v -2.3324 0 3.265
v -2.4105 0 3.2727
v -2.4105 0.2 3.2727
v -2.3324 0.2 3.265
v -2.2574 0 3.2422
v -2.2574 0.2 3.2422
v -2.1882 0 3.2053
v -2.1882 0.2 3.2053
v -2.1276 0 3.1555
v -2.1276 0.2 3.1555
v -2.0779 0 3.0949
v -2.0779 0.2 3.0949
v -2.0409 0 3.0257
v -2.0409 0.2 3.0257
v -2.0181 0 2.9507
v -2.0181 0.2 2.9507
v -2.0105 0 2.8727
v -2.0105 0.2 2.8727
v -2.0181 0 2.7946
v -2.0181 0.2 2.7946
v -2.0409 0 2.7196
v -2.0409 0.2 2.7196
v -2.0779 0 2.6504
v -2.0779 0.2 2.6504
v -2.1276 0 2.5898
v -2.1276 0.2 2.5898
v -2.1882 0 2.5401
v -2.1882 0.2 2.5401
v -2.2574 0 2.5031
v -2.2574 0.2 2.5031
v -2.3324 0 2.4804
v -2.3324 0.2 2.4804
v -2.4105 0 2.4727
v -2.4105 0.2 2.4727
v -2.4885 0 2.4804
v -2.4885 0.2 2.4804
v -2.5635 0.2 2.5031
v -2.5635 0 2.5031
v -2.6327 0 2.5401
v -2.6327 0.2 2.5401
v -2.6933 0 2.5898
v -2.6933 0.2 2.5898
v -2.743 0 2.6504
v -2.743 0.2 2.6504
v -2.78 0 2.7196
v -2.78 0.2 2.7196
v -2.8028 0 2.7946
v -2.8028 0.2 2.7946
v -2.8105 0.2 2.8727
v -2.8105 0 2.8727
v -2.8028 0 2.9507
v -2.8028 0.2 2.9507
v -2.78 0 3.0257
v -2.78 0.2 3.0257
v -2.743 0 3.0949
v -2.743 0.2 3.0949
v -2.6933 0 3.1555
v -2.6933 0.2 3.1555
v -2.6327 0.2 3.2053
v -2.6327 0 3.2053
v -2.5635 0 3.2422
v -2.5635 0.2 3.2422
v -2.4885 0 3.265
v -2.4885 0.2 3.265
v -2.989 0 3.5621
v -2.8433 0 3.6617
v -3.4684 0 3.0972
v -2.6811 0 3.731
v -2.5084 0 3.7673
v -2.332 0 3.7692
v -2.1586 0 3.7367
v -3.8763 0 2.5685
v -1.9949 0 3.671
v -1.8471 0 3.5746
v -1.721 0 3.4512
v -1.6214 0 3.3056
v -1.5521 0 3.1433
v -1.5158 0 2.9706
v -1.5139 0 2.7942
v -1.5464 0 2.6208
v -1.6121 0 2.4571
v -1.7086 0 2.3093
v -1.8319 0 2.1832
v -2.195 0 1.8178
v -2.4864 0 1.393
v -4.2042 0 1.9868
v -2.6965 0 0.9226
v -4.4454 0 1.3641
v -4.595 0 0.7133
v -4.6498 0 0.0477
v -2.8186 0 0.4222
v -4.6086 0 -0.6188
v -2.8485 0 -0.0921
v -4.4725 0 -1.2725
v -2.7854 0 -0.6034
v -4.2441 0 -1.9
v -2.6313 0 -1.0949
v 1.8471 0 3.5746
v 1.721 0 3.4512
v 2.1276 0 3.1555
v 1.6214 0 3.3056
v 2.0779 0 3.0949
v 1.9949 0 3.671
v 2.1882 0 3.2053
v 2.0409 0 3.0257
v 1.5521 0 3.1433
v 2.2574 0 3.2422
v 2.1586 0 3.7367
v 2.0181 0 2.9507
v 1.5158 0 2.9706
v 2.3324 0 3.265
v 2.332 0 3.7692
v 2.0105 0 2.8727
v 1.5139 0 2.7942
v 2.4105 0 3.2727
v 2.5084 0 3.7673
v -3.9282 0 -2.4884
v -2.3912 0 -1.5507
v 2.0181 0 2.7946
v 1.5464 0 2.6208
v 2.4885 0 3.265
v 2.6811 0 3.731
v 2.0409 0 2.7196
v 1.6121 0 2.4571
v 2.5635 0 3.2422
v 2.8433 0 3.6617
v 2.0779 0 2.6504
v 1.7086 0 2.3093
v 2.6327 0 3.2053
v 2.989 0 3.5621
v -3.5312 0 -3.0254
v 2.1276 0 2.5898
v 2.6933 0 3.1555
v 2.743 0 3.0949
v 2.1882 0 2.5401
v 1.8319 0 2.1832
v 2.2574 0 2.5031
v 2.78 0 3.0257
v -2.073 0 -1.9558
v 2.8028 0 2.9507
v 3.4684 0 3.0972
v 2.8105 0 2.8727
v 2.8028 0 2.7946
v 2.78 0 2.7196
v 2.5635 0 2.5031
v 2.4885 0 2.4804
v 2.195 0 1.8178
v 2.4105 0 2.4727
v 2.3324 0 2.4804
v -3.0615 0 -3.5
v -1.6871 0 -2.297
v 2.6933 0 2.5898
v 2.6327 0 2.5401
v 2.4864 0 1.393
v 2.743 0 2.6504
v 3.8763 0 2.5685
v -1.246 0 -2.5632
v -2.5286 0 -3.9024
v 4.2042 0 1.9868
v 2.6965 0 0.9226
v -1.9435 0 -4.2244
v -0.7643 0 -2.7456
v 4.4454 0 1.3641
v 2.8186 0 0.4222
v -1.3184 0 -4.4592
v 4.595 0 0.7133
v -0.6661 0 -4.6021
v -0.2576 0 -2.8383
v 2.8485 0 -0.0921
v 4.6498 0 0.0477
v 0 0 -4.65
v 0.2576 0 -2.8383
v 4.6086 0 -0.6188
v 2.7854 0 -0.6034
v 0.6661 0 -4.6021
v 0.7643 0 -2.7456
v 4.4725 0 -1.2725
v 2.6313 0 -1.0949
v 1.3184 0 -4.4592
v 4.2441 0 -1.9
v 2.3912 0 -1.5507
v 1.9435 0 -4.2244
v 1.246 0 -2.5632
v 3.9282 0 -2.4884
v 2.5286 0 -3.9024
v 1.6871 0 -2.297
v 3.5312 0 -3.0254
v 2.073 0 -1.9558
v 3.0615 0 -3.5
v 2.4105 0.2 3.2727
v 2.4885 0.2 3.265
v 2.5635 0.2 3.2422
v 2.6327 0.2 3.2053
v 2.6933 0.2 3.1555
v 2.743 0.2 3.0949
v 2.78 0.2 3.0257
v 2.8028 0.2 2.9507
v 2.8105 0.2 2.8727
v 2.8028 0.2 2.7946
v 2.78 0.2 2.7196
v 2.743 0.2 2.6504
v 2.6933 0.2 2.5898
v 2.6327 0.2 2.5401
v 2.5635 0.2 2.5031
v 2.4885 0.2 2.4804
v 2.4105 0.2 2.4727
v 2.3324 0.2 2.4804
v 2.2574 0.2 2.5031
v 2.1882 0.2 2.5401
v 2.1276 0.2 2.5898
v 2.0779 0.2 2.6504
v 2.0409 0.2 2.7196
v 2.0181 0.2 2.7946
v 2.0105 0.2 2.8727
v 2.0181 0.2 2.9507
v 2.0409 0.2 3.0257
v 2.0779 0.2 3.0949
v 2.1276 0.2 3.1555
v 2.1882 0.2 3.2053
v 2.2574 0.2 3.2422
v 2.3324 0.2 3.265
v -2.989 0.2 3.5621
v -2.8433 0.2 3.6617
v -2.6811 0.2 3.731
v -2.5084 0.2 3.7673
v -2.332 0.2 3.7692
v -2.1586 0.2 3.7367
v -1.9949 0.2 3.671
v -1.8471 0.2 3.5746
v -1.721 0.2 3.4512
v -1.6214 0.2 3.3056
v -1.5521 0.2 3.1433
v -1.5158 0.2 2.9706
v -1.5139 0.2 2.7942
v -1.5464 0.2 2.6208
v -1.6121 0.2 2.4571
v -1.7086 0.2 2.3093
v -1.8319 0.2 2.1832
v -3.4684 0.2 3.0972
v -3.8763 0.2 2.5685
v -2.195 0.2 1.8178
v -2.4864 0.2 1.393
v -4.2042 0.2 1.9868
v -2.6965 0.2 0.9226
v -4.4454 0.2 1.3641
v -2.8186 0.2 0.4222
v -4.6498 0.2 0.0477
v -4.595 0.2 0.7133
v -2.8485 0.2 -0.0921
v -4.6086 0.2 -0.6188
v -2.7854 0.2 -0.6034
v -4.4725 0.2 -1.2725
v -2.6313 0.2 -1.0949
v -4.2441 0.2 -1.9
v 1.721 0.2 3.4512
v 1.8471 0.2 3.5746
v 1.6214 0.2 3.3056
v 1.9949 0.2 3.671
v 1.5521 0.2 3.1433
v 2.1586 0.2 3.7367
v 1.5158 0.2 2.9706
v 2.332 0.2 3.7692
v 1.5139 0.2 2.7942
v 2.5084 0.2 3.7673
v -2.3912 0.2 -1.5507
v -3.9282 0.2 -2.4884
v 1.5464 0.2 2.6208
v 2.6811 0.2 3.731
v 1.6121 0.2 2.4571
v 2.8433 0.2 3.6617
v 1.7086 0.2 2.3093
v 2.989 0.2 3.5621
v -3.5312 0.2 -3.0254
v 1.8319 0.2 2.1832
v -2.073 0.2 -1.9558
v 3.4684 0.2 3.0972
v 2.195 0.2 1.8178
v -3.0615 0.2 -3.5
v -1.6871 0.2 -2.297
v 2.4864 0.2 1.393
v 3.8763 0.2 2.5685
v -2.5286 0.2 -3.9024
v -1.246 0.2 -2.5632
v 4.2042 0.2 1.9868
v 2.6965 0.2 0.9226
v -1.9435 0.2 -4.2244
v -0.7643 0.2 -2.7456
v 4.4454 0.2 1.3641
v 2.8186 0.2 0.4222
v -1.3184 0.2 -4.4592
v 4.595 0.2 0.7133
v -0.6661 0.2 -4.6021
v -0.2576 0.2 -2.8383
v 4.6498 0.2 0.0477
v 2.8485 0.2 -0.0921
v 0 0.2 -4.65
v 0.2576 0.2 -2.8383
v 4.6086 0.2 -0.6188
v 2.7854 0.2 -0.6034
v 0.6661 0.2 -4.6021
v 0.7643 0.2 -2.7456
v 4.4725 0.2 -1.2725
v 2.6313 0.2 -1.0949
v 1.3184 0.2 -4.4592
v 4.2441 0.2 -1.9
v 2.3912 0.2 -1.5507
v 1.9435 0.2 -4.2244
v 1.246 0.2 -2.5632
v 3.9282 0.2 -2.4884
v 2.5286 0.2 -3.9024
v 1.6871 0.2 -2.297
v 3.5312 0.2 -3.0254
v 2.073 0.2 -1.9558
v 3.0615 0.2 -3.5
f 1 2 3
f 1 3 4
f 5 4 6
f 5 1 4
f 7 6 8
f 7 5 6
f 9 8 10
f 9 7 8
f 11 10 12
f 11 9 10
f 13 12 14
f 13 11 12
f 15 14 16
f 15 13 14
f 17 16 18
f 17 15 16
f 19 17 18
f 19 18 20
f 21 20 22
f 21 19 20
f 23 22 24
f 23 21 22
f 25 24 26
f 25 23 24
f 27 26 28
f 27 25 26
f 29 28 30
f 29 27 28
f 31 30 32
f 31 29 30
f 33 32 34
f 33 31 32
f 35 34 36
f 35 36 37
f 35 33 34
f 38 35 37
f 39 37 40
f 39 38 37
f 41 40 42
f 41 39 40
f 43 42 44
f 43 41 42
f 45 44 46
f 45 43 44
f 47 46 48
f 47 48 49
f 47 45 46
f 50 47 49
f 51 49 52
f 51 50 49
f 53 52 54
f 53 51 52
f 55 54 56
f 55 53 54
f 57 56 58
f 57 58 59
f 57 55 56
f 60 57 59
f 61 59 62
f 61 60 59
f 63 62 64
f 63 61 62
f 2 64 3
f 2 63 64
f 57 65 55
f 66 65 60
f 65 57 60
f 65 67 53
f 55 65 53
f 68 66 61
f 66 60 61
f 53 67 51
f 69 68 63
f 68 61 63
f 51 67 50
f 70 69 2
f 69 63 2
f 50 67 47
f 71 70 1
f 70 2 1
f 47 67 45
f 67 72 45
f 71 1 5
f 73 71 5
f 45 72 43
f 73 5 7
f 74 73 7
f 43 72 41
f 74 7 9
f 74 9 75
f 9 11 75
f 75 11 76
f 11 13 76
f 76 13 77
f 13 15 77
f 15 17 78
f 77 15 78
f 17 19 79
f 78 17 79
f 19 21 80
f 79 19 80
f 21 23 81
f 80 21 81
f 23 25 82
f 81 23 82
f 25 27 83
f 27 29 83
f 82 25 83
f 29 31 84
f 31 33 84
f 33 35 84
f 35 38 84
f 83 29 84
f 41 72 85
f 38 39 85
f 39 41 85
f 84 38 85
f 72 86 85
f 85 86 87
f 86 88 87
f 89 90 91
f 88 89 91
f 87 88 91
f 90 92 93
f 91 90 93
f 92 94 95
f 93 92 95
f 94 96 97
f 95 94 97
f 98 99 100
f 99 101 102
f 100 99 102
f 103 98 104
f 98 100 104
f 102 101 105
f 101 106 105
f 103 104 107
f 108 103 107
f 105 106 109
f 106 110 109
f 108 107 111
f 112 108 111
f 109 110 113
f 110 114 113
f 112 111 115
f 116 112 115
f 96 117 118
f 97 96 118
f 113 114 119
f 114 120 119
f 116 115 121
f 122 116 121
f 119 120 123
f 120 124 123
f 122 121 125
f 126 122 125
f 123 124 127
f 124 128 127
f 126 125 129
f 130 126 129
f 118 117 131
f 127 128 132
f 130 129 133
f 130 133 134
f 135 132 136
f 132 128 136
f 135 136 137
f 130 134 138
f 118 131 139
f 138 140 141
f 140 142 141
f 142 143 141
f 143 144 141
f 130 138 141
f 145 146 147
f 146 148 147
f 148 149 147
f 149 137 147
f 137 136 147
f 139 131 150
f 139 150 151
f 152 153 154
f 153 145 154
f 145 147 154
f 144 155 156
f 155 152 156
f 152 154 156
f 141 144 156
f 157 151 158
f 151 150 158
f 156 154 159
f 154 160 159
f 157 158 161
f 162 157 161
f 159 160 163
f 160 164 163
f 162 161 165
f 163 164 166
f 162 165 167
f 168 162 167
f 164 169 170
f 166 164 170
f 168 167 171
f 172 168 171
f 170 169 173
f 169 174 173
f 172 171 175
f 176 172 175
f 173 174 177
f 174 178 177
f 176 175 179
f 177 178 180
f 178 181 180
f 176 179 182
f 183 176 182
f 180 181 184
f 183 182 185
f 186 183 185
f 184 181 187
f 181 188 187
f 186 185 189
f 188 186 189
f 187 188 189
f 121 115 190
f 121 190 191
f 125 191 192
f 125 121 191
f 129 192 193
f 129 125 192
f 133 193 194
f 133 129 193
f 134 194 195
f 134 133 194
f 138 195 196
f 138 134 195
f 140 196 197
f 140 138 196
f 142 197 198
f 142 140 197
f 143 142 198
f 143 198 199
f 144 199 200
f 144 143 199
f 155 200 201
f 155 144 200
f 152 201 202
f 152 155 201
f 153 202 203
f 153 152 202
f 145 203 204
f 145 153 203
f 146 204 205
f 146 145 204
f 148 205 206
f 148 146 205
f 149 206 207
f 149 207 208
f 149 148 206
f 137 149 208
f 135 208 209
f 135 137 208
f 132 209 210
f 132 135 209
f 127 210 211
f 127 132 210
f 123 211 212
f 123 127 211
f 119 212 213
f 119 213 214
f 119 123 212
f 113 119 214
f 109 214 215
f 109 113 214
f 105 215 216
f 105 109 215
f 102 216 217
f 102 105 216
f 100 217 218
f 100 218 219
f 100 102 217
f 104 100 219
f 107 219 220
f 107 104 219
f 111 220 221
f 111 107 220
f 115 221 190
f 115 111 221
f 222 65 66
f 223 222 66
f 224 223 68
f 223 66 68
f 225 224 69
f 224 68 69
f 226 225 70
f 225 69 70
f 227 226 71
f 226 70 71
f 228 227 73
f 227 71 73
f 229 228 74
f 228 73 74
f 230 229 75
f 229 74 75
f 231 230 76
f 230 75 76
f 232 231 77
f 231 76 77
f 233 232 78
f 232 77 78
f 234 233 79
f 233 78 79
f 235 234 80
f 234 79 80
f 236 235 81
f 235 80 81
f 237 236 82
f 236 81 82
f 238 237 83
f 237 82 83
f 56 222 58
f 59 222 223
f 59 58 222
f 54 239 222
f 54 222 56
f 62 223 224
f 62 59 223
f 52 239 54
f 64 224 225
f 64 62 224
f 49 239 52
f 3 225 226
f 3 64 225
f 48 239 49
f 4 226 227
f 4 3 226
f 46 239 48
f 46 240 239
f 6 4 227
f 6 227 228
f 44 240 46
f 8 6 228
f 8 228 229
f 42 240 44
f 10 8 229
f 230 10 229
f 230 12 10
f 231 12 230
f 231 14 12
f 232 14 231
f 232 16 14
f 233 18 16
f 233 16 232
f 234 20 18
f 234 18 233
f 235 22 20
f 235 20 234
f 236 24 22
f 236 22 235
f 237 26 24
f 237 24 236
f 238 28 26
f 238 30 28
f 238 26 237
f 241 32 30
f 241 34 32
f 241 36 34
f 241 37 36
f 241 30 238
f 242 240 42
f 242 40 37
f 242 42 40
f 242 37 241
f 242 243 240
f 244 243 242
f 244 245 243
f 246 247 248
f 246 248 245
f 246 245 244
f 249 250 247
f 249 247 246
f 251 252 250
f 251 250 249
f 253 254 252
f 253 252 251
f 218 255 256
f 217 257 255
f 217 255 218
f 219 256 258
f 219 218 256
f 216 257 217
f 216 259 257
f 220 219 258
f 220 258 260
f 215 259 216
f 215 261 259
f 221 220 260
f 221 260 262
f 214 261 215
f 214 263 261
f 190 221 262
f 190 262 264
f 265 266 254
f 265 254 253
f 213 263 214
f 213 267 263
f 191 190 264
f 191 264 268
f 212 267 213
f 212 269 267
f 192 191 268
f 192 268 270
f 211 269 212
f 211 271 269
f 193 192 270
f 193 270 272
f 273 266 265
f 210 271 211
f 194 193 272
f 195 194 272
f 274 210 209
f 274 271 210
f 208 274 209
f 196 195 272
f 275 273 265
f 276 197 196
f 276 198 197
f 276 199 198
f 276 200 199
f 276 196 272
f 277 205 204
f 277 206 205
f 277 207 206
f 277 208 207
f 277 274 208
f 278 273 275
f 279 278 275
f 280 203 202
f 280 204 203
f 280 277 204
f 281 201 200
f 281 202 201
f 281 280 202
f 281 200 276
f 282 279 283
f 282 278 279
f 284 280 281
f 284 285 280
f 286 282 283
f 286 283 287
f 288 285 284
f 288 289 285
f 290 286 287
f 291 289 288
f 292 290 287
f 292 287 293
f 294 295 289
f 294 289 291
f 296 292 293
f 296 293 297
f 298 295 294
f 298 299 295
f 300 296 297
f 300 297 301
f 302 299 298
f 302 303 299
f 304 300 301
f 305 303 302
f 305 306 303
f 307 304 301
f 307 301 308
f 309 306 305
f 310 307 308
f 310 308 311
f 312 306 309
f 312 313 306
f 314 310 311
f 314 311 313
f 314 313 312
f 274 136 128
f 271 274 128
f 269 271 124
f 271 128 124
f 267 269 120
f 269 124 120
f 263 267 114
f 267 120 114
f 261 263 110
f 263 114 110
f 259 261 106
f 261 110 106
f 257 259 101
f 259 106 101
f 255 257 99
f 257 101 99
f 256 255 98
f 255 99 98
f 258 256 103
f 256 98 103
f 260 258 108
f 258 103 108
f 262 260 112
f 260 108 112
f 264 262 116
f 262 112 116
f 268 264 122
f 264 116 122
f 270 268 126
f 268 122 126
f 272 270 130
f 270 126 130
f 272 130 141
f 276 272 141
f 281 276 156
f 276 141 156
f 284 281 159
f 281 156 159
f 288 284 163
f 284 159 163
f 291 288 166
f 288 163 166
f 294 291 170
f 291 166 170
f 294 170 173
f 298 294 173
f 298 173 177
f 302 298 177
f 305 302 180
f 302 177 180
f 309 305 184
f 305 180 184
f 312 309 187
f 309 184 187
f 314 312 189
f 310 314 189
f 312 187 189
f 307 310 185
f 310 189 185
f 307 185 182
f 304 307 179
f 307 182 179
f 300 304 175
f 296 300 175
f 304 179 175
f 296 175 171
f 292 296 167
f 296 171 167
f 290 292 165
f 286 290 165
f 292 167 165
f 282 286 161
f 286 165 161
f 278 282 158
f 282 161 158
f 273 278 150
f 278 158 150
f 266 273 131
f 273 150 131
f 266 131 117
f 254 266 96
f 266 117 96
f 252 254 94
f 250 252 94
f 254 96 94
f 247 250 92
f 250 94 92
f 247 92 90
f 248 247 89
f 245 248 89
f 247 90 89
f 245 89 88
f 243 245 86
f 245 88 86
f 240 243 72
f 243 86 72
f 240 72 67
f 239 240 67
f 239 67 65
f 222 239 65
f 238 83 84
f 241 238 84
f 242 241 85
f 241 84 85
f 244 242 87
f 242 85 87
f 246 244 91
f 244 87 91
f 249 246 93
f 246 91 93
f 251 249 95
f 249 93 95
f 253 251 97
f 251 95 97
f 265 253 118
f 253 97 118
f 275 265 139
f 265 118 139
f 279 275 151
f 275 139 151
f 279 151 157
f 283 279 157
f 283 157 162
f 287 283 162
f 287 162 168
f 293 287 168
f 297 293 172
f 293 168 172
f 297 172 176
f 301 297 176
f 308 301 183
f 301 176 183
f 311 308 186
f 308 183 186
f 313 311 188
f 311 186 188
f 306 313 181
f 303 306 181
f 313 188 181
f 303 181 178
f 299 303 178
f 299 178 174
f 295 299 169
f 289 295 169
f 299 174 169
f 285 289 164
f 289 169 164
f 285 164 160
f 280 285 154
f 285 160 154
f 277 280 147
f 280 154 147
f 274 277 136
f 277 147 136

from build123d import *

# Parameters (mm, degrees)
SKETCH2_R           = 0.4
BOSS_EXTRUDE1_DEPTH = 0.2


with BuildPart() as part:
    # Sketch2 → Boss-Extrude1 (new body)
    with BuildSketch(Plane(origin=(0, 0, 0), x_dir=(1, 0, 0), z_dir=(0, 1, 0))):
        with BuildLine():
            ThreePointArc((2.988962385, -3.562106661), (0, 4.65), (-2.988962385, -3.562106661))
            ThreePointArc((-2.988962385, -3.562106661), (-1.721013538, -3.45117551), (-1.831944688, -2.183226663))
            ThreePointArc((-1.831944688, -2.183226663), (0, 2.85), (1.831944688, -2.183226663))
            ThreePointArc((1.831944688, -2.183226663), (1.721013538, -3.45117551), (2.988962385, -3.562106661))
        make_face()
        with Locations(Location((-2.410453536, -2.872666662, 0), (0, 0, 270))):
            Circle(SKETCH2_R, mode=Mode.SUBTRACT)
        with Locations(Location((2.410453536, -2.872666662, 0), (0, 0, 270))):
            Circle(SKETCH2_R, mode=Mode.SUBTRACT)
    extrude(amount=BOSS_EXTRUDE1_DEPTH)


solid = part.part
